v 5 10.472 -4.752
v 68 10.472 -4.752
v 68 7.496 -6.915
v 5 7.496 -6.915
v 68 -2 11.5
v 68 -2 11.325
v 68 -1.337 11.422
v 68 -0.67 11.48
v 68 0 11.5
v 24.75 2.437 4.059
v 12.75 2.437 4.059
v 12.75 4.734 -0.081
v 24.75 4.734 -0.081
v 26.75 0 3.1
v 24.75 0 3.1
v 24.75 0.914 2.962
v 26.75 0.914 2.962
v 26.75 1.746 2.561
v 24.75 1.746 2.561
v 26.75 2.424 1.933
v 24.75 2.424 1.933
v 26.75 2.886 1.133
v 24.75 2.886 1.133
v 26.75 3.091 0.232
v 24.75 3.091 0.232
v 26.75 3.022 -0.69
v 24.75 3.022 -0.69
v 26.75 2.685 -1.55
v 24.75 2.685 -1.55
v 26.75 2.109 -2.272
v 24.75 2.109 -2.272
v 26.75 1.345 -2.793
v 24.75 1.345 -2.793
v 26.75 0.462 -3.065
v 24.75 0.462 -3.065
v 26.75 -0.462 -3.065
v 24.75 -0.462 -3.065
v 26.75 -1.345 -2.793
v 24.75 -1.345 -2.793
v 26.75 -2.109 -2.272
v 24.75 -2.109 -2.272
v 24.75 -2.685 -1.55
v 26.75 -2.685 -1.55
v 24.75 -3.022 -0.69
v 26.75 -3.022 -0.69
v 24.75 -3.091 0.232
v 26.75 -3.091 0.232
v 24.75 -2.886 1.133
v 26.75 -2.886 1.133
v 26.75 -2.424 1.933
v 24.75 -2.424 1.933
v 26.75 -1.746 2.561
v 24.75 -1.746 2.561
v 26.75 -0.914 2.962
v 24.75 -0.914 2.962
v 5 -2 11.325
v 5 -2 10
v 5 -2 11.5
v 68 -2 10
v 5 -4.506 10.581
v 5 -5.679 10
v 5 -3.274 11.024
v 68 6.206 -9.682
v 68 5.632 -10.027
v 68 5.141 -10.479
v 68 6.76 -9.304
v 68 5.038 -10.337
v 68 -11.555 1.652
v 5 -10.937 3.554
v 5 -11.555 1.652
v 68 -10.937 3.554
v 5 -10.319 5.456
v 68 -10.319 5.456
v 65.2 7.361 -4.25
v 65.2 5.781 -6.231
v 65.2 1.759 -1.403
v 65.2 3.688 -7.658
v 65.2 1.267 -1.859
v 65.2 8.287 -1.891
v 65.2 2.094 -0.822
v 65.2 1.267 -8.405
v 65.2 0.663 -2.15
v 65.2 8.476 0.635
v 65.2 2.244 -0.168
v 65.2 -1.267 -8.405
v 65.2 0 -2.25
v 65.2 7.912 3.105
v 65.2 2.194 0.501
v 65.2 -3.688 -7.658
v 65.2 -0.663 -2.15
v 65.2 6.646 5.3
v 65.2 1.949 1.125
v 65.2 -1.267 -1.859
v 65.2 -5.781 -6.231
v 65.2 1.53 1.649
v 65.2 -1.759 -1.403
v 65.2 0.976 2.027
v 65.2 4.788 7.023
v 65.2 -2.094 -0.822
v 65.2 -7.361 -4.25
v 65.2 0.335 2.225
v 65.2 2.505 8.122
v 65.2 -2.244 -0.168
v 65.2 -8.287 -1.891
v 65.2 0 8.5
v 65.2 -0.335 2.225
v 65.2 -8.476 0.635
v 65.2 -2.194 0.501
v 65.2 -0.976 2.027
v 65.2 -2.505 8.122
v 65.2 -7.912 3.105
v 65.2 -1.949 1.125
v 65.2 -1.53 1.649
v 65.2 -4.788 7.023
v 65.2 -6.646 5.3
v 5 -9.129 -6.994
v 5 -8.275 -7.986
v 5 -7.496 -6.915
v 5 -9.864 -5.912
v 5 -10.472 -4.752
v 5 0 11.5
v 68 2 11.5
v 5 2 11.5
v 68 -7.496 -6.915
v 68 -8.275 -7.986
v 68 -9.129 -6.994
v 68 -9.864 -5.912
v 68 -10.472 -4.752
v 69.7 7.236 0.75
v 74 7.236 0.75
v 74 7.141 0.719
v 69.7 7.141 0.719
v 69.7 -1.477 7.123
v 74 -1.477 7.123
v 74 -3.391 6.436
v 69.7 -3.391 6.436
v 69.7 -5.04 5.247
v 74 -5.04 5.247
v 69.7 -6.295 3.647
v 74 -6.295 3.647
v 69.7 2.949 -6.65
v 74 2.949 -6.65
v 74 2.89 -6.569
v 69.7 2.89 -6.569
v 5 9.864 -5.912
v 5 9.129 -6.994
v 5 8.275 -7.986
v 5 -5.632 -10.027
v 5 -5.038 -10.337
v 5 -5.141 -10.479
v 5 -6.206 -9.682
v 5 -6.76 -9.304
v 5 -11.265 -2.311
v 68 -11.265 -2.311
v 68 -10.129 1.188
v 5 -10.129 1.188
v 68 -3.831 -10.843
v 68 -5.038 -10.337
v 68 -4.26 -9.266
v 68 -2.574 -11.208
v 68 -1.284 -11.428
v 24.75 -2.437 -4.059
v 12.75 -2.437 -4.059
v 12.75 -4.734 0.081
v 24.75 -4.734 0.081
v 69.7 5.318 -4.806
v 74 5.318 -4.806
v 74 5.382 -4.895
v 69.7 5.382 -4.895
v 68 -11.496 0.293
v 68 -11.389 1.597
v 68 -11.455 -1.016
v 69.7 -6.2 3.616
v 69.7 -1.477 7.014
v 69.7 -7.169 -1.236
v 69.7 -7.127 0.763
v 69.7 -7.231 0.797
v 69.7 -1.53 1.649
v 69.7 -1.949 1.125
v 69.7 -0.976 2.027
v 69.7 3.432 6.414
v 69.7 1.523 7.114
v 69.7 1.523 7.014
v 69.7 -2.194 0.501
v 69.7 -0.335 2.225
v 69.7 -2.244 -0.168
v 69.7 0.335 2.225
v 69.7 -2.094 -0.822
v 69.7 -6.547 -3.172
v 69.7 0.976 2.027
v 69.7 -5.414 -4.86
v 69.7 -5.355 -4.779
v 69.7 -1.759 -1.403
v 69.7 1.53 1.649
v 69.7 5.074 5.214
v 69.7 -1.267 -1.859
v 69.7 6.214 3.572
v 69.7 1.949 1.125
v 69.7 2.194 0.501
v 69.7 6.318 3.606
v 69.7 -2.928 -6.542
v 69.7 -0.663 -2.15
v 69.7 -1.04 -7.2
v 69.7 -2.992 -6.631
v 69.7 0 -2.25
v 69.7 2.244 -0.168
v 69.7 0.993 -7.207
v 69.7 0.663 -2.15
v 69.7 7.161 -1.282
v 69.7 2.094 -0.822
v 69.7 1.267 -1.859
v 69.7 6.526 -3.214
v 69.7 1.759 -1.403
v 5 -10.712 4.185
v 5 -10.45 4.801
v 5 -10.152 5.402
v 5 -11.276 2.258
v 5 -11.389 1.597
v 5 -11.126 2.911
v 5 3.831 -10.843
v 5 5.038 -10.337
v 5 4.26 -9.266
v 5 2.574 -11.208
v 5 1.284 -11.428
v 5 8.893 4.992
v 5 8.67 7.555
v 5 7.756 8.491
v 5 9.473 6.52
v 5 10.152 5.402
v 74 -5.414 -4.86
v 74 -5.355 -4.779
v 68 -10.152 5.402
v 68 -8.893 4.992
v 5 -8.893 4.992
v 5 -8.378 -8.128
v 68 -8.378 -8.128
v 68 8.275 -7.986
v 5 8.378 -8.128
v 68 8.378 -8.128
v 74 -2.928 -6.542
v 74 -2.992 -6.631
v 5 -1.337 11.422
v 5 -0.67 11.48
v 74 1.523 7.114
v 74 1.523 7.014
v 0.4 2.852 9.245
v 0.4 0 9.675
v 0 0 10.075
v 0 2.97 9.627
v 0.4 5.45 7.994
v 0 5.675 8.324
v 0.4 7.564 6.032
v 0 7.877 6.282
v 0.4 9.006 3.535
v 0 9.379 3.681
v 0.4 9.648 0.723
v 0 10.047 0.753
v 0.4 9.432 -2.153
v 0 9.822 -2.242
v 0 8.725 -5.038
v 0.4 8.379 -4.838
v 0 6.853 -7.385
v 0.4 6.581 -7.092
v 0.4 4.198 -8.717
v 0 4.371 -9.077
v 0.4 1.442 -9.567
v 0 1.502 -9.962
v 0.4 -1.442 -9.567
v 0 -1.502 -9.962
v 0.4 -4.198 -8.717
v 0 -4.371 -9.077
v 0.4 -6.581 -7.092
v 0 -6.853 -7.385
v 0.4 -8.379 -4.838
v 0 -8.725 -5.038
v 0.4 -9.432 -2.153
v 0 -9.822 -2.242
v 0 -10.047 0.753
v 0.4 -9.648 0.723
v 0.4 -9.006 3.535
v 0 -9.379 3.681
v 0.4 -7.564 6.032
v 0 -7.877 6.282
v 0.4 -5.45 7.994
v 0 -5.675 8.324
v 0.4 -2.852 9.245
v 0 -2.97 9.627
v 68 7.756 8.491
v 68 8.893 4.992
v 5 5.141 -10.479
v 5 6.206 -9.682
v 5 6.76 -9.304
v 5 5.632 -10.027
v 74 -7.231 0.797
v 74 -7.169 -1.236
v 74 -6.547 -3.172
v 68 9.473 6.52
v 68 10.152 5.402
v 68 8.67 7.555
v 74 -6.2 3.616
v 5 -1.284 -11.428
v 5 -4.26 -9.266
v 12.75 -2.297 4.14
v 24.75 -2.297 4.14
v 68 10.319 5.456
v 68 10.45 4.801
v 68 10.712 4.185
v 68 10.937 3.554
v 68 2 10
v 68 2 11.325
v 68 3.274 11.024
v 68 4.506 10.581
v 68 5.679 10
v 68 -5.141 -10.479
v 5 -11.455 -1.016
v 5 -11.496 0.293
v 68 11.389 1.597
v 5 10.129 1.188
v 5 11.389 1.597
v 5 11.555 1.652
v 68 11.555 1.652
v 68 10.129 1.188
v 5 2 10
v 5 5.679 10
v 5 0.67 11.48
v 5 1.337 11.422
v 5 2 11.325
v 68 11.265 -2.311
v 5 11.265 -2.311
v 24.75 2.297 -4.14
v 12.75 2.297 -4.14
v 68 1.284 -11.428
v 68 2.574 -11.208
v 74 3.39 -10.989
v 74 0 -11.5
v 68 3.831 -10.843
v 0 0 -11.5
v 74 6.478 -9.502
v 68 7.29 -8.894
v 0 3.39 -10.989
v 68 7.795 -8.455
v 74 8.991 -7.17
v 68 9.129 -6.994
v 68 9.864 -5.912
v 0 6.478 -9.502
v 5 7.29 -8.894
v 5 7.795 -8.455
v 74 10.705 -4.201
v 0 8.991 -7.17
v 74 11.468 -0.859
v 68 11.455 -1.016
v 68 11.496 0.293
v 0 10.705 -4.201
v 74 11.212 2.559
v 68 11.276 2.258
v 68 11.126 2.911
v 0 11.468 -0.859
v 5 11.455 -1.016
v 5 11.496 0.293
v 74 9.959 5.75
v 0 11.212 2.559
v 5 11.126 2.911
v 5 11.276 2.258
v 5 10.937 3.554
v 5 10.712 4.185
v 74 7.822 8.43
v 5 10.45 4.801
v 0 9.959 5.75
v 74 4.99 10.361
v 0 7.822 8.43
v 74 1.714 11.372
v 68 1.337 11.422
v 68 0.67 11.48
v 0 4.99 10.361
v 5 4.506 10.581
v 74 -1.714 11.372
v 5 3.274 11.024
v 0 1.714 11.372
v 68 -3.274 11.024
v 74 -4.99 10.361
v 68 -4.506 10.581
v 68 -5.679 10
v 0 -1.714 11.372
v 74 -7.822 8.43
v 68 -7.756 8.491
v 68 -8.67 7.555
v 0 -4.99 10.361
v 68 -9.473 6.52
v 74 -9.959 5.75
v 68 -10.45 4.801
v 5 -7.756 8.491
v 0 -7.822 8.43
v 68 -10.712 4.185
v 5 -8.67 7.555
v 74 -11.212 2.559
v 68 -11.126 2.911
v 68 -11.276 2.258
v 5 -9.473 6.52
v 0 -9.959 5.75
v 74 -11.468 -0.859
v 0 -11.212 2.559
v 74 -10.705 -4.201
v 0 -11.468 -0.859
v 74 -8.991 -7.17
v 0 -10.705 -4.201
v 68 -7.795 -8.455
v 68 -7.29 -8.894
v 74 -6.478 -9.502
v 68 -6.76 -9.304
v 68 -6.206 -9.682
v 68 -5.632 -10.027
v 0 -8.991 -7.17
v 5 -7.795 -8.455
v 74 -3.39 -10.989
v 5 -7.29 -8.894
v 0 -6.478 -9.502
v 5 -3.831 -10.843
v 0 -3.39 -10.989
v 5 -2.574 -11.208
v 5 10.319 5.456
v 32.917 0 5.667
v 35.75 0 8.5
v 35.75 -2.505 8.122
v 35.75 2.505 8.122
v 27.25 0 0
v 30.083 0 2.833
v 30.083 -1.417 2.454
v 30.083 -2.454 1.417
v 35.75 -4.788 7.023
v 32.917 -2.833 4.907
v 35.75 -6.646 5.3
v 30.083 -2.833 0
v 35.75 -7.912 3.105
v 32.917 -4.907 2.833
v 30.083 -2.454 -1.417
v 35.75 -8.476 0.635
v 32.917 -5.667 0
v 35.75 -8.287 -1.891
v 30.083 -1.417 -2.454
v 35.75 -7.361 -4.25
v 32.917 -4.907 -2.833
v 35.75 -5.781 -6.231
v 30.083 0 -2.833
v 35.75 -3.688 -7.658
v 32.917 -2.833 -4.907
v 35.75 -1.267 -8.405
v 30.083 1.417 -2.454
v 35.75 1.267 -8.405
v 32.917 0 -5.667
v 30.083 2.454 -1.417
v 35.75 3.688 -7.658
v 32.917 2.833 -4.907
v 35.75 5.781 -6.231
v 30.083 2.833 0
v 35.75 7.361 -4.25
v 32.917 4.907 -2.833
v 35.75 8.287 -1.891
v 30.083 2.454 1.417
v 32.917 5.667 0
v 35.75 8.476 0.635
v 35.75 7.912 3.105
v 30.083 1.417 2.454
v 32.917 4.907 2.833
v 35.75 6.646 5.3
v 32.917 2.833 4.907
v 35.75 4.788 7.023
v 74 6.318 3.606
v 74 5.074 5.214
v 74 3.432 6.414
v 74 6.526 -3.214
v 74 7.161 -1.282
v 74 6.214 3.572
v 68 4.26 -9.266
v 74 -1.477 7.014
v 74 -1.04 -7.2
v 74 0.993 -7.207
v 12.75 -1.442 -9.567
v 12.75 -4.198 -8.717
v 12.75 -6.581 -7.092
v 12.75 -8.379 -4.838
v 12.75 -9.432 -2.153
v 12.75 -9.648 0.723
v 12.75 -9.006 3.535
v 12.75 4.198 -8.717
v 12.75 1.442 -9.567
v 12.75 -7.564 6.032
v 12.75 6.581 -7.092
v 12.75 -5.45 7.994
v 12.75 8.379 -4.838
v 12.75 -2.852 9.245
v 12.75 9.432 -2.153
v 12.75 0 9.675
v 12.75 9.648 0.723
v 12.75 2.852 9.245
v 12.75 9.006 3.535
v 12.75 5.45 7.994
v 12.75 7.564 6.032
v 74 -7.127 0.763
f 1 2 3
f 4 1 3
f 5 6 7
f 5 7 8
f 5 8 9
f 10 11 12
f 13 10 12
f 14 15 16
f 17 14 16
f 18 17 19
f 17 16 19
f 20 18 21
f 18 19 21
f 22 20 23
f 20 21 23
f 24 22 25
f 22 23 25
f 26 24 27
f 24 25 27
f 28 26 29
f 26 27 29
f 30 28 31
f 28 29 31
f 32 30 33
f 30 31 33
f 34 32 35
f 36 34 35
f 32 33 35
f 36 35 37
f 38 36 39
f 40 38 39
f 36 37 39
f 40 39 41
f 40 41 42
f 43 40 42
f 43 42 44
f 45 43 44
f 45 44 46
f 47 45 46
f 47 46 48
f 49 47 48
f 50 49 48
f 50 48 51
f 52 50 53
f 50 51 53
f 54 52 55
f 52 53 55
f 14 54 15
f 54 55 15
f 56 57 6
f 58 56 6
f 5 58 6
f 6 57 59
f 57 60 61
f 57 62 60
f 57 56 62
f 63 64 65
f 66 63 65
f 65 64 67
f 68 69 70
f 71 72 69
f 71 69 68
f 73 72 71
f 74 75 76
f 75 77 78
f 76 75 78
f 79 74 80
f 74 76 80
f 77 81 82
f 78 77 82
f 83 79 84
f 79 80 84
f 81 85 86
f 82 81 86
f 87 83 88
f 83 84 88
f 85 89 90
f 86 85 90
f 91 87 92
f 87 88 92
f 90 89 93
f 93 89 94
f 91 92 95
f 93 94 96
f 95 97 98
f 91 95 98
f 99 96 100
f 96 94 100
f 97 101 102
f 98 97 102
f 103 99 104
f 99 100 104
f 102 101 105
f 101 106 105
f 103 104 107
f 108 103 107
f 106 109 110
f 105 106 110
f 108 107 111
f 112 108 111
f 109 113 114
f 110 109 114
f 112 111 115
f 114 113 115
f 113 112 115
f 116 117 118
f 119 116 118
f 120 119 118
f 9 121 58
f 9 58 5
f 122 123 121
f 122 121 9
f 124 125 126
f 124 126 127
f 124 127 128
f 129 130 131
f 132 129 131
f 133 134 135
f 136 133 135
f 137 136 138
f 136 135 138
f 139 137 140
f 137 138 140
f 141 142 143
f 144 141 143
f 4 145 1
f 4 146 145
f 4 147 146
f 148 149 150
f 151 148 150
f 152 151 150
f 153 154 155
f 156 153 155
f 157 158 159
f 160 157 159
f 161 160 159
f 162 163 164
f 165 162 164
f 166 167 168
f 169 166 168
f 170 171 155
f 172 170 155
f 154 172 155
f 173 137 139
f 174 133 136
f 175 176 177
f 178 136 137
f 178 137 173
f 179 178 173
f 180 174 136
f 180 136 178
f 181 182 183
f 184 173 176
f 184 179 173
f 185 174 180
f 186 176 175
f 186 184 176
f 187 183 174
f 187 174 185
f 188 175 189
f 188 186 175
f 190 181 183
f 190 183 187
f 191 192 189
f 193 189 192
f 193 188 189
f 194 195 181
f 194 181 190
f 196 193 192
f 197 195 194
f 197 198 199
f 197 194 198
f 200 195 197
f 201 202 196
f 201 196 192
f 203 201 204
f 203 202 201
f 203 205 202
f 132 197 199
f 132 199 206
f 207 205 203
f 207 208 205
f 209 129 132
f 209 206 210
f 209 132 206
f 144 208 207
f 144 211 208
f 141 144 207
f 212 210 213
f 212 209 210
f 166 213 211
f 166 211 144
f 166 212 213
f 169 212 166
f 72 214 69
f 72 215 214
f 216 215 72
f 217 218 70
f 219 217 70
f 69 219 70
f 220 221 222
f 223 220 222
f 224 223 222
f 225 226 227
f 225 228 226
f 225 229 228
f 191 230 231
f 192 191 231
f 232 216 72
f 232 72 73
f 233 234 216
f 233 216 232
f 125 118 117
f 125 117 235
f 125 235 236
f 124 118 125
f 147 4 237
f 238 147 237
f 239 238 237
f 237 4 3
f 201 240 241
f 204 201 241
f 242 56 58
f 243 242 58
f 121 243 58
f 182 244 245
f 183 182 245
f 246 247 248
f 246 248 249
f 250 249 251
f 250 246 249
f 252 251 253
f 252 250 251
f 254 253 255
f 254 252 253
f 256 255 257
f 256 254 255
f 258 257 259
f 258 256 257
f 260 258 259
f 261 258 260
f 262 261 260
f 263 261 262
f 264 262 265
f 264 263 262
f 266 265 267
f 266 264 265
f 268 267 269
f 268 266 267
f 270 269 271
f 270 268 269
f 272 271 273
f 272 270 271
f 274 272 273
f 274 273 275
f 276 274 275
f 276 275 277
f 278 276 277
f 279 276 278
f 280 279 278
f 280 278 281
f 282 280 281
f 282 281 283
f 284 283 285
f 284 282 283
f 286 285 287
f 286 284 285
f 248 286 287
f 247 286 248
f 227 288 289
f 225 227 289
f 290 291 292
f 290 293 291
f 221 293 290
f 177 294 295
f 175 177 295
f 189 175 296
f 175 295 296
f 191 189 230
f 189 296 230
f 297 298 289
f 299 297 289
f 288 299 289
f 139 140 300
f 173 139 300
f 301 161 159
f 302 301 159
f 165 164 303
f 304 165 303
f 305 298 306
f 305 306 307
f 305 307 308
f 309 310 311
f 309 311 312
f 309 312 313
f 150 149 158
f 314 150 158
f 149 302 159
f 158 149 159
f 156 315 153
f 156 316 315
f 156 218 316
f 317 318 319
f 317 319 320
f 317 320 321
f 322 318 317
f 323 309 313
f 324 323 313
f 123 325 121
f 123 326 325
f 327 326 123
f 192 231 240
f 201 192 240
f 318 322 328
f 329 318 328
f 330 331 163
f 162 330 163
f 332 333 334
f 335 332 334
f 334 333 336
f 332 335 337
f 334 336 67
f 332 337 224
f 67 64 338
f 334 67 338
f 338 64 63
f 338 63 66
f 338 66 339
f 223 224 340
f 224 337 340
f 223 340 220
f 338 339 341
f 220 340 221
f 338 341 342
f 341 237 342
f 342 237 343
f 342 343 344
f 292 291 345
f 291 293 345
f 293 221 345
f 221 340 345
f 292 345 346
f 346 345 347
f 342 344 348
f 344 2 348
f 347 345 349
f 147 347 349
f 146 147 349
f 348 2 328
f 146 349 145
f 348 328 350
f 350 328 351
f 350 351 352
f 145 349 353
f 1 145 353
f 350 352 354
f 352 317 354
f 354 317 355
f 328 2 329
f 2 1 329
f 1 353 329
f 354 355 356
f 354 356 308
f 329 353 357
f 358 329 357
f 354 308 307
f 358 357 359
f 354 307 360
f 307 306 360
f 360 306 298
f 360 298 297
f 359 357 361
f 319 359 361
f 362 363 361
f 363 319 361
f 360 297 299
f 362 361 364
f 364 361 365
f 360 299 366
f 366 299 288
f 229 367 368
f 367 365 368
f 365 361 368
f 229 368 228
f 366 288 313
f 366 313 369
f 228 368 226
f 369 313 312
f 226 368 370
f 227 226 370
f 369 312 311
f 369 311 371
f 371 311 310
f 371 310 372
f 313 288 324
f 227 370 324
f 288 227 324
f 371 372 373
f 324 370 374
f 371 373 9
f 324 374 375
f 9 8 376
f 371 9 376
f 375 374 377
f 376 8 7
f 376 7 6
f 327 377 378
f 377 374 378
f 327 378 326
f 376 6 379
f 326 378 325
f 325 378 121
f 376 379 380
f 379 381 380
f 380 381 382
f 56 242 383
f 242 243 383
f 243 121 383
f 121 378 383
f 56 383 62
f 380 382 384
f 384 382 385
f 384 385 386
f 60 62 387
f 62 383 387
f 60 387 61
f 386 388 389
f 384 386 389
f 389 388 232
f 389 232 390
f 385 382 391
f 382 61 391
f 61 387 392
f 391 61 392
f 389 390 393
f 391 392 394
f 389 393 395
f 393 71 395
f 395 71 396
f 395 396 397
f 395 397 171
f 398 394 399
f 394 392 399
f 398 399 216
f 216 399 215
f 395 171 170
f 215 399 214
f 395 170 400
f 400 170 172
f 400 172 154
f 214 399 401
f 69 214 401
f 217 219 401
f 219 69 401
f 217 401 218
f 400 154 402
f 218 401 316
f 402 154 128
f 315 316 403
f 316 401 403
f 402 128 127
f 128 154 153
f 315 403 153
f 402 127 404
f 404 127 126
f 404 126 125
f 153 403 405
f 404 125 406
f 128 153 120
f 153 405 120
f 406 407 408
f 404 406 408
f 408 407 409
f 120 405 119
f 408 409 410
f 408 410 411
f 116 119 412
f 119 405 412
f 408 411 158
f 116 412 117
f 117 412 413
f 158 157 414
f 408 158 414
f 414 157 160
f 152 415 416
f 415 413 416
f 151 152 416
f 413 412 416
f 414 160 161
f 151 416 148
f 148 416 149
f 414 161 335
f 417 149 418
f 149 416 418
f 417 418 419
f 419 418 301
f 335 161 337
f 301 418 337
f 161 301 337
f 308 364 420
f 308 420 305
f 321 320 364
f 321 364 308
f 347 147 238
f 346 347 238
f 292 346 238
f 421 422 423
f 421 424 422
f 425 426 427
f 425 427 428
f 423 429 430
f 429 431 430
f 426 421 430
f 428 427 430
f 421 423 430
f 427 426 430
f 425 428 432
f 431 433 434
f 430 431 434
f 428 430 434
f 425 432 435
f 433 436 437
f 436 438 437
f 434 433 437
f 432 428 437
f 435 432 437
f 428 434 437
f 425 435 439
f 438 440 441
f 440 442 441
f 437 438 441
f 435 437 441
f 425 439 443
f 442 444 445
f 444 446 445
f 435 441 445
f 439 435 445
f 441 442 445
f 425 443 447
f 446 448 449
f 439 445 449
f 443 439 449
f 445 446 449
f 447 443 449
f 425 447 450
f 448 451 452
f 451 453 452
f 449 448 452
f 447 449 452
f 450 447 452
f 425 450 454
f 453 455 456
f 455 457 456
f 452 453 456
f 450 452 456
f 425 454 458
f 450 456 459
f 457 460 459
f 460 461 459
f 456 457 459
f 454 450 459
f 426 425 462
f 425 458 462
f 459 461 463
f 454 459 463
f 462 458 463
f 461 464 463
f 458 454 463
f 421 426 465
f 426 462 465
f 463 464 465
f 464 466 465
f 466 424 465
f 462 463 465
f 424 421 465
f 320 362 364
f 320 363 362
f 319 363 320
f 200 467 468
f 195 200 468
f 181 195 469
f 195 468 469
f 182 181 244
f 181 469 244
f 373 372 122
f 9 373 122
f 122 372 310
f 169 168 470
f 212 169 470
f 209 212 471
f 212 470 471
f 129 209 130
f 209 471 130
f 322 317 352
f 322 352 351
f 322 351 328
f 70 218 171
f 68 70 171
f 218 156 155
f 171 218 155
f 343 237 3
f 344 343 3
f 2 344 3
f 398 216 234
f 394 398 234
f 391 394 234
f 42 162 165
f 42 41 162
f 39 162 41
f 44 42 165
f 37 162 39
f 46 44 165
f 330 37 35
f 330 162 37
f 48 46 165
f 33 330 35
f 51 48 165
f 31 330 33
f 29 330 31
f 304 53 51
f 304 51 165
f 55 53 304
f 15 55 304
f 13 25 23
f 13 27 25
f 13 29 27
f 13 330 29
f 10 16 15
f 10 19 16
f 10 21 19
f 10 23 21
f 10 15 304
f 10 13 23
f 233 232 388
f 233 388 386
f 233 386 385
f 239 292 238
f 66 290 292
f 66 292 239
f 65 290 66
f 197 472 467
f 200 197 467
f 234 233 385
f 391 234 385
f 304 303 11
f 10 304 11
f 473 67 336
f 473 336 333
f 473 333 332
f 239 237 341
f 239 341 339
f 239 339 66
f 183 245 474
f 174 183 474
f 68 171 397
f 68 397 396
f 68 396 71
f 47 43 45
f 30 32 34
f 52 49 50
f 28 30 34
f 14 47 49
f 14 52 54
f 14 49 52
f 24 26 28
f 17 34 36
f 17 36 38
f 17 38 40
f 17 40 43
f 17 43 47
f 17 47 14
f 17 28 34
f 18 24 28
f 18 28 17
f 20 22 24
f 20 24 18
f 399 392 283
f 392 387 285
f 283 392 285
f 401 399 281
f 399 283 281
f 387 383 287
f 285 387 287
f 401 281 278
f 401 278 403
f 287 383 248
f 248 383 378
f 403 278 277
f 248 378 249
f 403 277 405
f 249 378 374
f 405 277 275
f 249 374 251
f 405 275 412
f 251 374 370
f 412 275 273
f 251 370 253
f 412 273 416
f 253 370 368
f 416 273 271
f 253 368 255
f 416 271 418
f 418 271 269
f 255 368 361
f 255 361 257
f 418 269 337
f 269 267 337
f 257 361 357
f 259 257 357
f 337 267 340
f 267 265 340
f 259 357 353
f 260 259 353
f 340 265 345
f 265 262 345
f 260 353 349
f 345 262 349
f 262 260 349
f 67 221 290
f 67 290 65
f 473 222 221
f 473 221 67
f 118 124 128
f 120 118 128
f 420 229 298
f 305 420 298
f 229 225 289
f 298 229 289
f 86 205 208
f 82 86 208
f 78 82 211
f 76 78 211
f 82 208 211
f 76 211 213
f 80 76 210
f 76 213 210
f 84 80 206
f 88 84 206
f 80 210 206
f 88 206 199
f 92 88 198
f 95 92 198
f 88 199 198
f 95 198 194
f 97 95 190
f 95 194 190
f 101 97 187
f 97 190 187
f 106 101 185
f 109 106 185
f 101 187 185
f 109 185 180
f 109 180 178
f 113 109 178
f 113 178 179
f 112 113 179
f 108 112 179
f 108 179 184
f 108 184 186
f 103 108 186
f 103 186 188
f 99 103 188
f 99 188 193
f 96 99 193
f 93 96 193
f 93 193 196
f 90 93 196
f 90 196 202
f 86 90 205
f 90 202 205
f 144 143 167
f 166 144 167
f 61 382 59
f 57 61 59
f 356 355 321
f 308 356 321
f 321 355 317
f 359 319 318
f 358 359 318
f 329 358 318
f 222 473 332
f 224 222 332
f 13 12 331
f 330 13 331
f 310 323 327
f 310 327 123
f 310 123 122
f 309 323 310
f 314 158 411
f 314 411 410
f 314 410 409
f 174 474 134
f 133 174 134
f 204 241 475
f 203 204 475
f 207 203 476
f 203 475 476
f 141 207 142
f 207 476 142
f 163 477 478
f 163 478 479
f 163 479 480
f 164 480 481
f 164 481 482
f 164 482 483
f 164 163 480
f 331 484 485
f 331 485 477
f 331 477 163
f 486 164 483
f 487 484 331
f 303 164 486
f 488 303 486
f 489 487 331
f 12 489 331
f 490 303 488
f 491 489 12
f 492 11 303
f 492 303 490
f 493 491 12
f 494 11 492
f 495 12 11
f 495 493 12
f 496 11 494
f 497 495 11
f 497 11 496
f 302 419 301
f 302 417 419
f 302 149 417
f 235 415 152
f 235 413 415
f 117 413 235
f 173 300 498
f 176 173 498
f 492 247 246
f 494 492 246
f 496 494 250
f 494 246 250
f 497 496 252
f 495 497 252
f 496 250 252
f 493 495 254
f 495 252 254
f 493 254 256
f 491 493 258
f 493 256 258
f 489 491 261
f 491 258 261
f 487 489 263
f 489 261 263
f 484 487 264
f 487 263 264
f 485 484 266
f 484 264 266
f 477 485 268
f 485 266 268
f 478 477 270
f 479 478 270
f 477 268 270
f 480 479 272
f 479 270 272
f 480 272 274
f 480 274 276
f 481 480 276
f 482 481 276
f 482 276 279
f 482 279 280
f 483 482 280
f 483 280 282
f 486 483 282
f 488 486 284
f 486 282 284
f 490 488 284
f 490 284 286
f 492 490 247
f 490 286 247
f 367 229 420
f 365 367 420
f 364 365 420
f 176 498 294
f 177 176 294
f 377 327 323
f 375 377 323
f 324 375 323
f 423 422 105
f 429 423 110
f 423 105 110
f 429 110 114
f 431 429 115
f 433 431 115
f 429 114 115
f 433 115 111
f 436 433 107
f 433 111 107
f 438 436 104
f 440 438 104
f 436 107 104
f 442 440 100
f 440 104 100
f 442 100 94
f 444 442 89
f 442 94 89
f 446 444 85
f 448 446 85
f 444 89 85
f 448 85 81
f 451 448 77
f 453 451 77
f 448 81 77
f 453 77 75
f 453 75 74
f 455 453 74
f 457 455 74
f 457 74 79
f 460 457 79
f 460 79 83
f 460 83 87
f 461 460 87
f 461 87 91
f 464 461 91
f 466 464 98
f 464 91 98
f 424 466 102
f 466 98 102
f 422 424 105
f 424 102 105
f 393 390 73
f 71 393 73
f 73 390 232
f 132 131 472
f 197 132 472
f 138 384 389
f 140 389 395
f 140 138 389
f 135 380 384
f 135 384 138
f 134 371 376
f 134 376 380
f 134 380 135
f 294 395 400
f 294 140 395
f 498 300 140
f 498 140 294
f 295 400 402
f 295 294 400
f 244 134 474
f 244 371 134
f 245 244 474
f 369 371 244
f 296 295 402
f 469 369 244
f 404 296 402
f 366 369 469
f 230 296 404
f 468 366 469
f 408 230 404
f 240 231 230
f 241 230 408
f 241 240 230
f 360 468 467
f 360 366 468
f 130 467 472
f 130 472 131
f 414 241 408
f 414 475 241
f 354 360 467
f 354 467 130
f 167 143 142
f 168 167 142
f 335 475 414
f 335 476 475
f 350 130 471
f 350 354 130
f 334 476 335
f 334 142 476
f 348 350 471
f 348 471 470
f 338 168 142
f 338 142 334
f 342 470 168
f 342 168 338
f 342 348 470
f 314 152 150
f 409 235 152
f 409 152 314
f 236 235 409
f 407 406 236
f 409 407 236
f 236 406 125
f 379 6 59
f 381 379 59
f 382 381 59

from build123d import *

# Parameters (mm, degrees)
SKIZZE1_R                                 = 11.5
GRUNDK_RPER_WALZE_DEPTH                   = 74
PRESSPASSUNG_KUGELLAGER_DEPTH             = 4.3
SKIZZE3_R                                 = 2.25
M4_SCHRAUBENF_HRUNG_DEPTH                 = 4.5
SKIZZE4_R                                 = 9.675
MOTORAUSSPARUNG_DEPTH                     = 12.75
ZERST_RUNGSELEMENT_START                  = -6
SKIZZE7_W                                 = 1.5
SKIZZE7_H                                 = 15
ZERST_RUNGSELEMENT_AUSSPARUNG_DEPTH       = 63
SKIZZE8_W                                 = 63
SKIZZE8_H                                 = 4
ZERST_RUNGSELEMENT_RECHTECK_DEPTH         = 1.5
M5_MOTOR_MUTTER_DEPTH                     = 12
SKIZZE12_R                                = 3.1
M5_AUSLAUF_SCHRAUBE_DEPTH                 = 2
ZERST_RUNGSELEMENT_VERVIELF_LTIGUNG_COUNT = 5
FASE1_SIZE                                = 0.4


with BuildPart() as part:
    # Skizze1 → Grundkörper Walze (new body)
    with BuildSketch(Plane(origin=(0, 0, 0), x_dir=(0, 0, -1), z_dir=(1, 0, 0))):
        Circle(SKIZZE1_R)
    extrude(amount=GRUNDK_RPER_WALZE_DEPTH)

    # Skizze2 → Presspassung Kugellager (cut)
    with BuildSketch(Plane(origin=(74, 0, 0), x_dir=(0, 0, -1), z_dir=(1, 0, 0))):
        with BuildLine():
            Line((-7.1137911, 1.5230237), (-7.0137911, 1.5230237))
            Line((-7.0137911, 1.5230237), (-7.0137911, -1.4769763))
            Line((-7.0137911, -1.4769763), (-7.123493947, -1.4769763))
            ThreePointArc((-7.123493947, -1.4769763), (-5.899398016, -4.257079756), (-3.646763959, -6.294977175))
            Line((-3.646763959, -6.294977175), (-3.61586226, -6.199871523))
            Line((-3.61586226, -6.199871523), (-0.762692711, -7.126922506))
            Line((-0.762692711, -7.126922506), (-0.796592755, -7.231256114))
            ThreePointArc((-0.796592755, -7.231256114), (2.225709199, -6.926170916), (4.859967024, -5.413533553))
            Line((4.859967024, -5.413533553), (4.779065325, -5.354755027))
            Line((4.779065325, -5.354755027), (6.542421081, -2.927704044))
            Line((6.542421081, -2.927704044), (6.631172549, -2.99218576))
            ThreePointArc((6.631172549, -2.99218576), (7.27496195, -0.023529282), (6.650388764, 2.94922944))
            Line((6.650388764, 2.94922944), (6.569487065, 2.890450915))
            Line((6.569487065, 2.890450915), (4.806131308, 5.317501898))
            Line((4.806131308, 5.317501898), (4.894882775, 5.381983613))
            ThreePointArc((4.894882775, 5.381983613), (2.270464553, 6.91162902), (-0.749800729, 7.236257587))
            Line((-0.749800729, 7.236257587), (-0.71889903, 7.141151935))
            Line((-0.71889903, 7.141151935), (-3.572068579, 6.214100952))
            Line((-3.572068579, 6.214100952), (-3.605968623, 6.31843456))
            ThreePointArc((-3.605968623, 6.31843456), (-5.871737686, 4.295150934), (-7.1137911, 1.5230237))
        make_face()
    extrude(amount=-PRESSPASSUNG_KUGELLAGER_DEPTH, mode=Mode.SUBTRACT)

    # Skizze3 → M4 Schraubenführung (cut)
    with BuildSketch(Plane(origin=(69.7, 0, 0), x_dir=(0, 0, -1), z_dir=(1, 0, 0))):
        Circle(SKIZZE3_R)
    extrude(amount=-M4_SCHRAUBENF_HRUNG_DEPTH, mode=Mode.SUBTRACT)

    # Skizze4 → Motoraussparung (cut)
    with BuildSketch(Plane.ZY):
        Circle(SKIZZE4_R)
    extrude(amount=-MOTORAUSSPARUNG_DEPTH, mode=Mode.SUBTRACT)

    # Skizze7 → Zerstörungselement Aussparung (cut)
    with BuildSketch(Plane(origin=(74, 0, 0), x_dir=(0, 0, -1), z_dir=(1, 0, 0)).offset(ZERST_RUNGSELEMENT_START)):
        with Locations((-10.75, 0)):
            Rectangle(SKIZZE7_W, SKIZZE7_H)
    zerst_rungselement_aussparung = extrude(amount=-ZERST_RUNGSELEMENT_AUSSPARUNG_DEPTH, mode=Mode.SUBTRACT)

    # Skizze8 → Zerstörungselement Rechteck (add)
    with BuildSketch(Plane.XY.offset(10)):
        with Locations((36.5, 0)):
            Rectangle(SKIZZE8_W, SKIZZE8_H)
    zerst_rungselement_rechteck = extrude(amount=ZERST_RUNGSELEMENT_RECHTECK_DEPTH)

    # Skizze10 → M5 Motor Mutter (cut)
    with BuildSketch(Plane.ZY.offset(-12.75)):
        Polygon((4.139835299, -2.29675794), (4.058968371, 2.436823566), (-0.080866927, 4.733581506), (-4.139835299, 2.29675794), (-4.058968371, -2.436823566), (0.080866927, -4.733581506), align=None)
    extrude(amount=-M5_MOTOR_MUTTER_DEPTH, mode=Mode.SUBTRACT)

    # Skizze12 → M5 Auslauf Schraube (cut)
    with BuildSketch(Plane.ZY.offset(-24.75)):
        Circle(SKIZZE12_R)
    extrude(amount=-M5_AUSLAUF_SCHRAUBE_DEPTH, mode=Mode.SUBTRACT)

    # Zerstörungselement Vervielfältigung: Zerstörungselement Aussparung, Zerstörungselement Rechteck ×5 about axis
    zerst_rungselement_vervielf_ltigung_axis = Axis((0, 0, 0), (1, 0, 0))
    add([zerst_rungselement_aussparung.rotate(zerst_rungselement_vervielf_ltigung_axis, i * 360 / ZERST_RUNGSELEMENT_VERVIELF_LTIGUNG_COUNT) for i in range(1, ZERST_RUNGSELEMENT_VERVIELF_LTIGUNG_COUNT)], mode=Mode.SUBTRACT)
    add([zerst_rungselement_rechteck.rotate(zerst_rungselement_vervielf_ltigung_axis, i * 360 / ZERST_RUNGSELEMENT_VERVIELF_LTIGUNG_COUNT) for i in range(1, ZERST_RUNGSELEMENT_VERVIELF_LTIGUNG_COUNT)])

    # Skizze15 → Innenaussparung (revolve, cut)
    with BuildSketch(Plane.XY, mode=Mode.PRIVATE) as innenaussparung_sk:
        Polygon((27.25, 0), (35.75, 8.5), (65.2, 8.5), (65.2, 0), align=None)
    revolve(innenaussparung_sk.sketch.rotate(Axis((-6.893942049, 0, 0), (1, 0, 0)), 90), axis=Axis((-6.893942049, 0, 0), (1, 0, 0)), mode=Mode.SUBTRACT)

    # Fase1
    fase1_edges = [part.edges().sort_by_distance(p)[0] for p in [
        (0, 0, -9.675),
    ]]
    chamfer(fase1_edges, length=FASE1_SIZE)


solid = part.part
